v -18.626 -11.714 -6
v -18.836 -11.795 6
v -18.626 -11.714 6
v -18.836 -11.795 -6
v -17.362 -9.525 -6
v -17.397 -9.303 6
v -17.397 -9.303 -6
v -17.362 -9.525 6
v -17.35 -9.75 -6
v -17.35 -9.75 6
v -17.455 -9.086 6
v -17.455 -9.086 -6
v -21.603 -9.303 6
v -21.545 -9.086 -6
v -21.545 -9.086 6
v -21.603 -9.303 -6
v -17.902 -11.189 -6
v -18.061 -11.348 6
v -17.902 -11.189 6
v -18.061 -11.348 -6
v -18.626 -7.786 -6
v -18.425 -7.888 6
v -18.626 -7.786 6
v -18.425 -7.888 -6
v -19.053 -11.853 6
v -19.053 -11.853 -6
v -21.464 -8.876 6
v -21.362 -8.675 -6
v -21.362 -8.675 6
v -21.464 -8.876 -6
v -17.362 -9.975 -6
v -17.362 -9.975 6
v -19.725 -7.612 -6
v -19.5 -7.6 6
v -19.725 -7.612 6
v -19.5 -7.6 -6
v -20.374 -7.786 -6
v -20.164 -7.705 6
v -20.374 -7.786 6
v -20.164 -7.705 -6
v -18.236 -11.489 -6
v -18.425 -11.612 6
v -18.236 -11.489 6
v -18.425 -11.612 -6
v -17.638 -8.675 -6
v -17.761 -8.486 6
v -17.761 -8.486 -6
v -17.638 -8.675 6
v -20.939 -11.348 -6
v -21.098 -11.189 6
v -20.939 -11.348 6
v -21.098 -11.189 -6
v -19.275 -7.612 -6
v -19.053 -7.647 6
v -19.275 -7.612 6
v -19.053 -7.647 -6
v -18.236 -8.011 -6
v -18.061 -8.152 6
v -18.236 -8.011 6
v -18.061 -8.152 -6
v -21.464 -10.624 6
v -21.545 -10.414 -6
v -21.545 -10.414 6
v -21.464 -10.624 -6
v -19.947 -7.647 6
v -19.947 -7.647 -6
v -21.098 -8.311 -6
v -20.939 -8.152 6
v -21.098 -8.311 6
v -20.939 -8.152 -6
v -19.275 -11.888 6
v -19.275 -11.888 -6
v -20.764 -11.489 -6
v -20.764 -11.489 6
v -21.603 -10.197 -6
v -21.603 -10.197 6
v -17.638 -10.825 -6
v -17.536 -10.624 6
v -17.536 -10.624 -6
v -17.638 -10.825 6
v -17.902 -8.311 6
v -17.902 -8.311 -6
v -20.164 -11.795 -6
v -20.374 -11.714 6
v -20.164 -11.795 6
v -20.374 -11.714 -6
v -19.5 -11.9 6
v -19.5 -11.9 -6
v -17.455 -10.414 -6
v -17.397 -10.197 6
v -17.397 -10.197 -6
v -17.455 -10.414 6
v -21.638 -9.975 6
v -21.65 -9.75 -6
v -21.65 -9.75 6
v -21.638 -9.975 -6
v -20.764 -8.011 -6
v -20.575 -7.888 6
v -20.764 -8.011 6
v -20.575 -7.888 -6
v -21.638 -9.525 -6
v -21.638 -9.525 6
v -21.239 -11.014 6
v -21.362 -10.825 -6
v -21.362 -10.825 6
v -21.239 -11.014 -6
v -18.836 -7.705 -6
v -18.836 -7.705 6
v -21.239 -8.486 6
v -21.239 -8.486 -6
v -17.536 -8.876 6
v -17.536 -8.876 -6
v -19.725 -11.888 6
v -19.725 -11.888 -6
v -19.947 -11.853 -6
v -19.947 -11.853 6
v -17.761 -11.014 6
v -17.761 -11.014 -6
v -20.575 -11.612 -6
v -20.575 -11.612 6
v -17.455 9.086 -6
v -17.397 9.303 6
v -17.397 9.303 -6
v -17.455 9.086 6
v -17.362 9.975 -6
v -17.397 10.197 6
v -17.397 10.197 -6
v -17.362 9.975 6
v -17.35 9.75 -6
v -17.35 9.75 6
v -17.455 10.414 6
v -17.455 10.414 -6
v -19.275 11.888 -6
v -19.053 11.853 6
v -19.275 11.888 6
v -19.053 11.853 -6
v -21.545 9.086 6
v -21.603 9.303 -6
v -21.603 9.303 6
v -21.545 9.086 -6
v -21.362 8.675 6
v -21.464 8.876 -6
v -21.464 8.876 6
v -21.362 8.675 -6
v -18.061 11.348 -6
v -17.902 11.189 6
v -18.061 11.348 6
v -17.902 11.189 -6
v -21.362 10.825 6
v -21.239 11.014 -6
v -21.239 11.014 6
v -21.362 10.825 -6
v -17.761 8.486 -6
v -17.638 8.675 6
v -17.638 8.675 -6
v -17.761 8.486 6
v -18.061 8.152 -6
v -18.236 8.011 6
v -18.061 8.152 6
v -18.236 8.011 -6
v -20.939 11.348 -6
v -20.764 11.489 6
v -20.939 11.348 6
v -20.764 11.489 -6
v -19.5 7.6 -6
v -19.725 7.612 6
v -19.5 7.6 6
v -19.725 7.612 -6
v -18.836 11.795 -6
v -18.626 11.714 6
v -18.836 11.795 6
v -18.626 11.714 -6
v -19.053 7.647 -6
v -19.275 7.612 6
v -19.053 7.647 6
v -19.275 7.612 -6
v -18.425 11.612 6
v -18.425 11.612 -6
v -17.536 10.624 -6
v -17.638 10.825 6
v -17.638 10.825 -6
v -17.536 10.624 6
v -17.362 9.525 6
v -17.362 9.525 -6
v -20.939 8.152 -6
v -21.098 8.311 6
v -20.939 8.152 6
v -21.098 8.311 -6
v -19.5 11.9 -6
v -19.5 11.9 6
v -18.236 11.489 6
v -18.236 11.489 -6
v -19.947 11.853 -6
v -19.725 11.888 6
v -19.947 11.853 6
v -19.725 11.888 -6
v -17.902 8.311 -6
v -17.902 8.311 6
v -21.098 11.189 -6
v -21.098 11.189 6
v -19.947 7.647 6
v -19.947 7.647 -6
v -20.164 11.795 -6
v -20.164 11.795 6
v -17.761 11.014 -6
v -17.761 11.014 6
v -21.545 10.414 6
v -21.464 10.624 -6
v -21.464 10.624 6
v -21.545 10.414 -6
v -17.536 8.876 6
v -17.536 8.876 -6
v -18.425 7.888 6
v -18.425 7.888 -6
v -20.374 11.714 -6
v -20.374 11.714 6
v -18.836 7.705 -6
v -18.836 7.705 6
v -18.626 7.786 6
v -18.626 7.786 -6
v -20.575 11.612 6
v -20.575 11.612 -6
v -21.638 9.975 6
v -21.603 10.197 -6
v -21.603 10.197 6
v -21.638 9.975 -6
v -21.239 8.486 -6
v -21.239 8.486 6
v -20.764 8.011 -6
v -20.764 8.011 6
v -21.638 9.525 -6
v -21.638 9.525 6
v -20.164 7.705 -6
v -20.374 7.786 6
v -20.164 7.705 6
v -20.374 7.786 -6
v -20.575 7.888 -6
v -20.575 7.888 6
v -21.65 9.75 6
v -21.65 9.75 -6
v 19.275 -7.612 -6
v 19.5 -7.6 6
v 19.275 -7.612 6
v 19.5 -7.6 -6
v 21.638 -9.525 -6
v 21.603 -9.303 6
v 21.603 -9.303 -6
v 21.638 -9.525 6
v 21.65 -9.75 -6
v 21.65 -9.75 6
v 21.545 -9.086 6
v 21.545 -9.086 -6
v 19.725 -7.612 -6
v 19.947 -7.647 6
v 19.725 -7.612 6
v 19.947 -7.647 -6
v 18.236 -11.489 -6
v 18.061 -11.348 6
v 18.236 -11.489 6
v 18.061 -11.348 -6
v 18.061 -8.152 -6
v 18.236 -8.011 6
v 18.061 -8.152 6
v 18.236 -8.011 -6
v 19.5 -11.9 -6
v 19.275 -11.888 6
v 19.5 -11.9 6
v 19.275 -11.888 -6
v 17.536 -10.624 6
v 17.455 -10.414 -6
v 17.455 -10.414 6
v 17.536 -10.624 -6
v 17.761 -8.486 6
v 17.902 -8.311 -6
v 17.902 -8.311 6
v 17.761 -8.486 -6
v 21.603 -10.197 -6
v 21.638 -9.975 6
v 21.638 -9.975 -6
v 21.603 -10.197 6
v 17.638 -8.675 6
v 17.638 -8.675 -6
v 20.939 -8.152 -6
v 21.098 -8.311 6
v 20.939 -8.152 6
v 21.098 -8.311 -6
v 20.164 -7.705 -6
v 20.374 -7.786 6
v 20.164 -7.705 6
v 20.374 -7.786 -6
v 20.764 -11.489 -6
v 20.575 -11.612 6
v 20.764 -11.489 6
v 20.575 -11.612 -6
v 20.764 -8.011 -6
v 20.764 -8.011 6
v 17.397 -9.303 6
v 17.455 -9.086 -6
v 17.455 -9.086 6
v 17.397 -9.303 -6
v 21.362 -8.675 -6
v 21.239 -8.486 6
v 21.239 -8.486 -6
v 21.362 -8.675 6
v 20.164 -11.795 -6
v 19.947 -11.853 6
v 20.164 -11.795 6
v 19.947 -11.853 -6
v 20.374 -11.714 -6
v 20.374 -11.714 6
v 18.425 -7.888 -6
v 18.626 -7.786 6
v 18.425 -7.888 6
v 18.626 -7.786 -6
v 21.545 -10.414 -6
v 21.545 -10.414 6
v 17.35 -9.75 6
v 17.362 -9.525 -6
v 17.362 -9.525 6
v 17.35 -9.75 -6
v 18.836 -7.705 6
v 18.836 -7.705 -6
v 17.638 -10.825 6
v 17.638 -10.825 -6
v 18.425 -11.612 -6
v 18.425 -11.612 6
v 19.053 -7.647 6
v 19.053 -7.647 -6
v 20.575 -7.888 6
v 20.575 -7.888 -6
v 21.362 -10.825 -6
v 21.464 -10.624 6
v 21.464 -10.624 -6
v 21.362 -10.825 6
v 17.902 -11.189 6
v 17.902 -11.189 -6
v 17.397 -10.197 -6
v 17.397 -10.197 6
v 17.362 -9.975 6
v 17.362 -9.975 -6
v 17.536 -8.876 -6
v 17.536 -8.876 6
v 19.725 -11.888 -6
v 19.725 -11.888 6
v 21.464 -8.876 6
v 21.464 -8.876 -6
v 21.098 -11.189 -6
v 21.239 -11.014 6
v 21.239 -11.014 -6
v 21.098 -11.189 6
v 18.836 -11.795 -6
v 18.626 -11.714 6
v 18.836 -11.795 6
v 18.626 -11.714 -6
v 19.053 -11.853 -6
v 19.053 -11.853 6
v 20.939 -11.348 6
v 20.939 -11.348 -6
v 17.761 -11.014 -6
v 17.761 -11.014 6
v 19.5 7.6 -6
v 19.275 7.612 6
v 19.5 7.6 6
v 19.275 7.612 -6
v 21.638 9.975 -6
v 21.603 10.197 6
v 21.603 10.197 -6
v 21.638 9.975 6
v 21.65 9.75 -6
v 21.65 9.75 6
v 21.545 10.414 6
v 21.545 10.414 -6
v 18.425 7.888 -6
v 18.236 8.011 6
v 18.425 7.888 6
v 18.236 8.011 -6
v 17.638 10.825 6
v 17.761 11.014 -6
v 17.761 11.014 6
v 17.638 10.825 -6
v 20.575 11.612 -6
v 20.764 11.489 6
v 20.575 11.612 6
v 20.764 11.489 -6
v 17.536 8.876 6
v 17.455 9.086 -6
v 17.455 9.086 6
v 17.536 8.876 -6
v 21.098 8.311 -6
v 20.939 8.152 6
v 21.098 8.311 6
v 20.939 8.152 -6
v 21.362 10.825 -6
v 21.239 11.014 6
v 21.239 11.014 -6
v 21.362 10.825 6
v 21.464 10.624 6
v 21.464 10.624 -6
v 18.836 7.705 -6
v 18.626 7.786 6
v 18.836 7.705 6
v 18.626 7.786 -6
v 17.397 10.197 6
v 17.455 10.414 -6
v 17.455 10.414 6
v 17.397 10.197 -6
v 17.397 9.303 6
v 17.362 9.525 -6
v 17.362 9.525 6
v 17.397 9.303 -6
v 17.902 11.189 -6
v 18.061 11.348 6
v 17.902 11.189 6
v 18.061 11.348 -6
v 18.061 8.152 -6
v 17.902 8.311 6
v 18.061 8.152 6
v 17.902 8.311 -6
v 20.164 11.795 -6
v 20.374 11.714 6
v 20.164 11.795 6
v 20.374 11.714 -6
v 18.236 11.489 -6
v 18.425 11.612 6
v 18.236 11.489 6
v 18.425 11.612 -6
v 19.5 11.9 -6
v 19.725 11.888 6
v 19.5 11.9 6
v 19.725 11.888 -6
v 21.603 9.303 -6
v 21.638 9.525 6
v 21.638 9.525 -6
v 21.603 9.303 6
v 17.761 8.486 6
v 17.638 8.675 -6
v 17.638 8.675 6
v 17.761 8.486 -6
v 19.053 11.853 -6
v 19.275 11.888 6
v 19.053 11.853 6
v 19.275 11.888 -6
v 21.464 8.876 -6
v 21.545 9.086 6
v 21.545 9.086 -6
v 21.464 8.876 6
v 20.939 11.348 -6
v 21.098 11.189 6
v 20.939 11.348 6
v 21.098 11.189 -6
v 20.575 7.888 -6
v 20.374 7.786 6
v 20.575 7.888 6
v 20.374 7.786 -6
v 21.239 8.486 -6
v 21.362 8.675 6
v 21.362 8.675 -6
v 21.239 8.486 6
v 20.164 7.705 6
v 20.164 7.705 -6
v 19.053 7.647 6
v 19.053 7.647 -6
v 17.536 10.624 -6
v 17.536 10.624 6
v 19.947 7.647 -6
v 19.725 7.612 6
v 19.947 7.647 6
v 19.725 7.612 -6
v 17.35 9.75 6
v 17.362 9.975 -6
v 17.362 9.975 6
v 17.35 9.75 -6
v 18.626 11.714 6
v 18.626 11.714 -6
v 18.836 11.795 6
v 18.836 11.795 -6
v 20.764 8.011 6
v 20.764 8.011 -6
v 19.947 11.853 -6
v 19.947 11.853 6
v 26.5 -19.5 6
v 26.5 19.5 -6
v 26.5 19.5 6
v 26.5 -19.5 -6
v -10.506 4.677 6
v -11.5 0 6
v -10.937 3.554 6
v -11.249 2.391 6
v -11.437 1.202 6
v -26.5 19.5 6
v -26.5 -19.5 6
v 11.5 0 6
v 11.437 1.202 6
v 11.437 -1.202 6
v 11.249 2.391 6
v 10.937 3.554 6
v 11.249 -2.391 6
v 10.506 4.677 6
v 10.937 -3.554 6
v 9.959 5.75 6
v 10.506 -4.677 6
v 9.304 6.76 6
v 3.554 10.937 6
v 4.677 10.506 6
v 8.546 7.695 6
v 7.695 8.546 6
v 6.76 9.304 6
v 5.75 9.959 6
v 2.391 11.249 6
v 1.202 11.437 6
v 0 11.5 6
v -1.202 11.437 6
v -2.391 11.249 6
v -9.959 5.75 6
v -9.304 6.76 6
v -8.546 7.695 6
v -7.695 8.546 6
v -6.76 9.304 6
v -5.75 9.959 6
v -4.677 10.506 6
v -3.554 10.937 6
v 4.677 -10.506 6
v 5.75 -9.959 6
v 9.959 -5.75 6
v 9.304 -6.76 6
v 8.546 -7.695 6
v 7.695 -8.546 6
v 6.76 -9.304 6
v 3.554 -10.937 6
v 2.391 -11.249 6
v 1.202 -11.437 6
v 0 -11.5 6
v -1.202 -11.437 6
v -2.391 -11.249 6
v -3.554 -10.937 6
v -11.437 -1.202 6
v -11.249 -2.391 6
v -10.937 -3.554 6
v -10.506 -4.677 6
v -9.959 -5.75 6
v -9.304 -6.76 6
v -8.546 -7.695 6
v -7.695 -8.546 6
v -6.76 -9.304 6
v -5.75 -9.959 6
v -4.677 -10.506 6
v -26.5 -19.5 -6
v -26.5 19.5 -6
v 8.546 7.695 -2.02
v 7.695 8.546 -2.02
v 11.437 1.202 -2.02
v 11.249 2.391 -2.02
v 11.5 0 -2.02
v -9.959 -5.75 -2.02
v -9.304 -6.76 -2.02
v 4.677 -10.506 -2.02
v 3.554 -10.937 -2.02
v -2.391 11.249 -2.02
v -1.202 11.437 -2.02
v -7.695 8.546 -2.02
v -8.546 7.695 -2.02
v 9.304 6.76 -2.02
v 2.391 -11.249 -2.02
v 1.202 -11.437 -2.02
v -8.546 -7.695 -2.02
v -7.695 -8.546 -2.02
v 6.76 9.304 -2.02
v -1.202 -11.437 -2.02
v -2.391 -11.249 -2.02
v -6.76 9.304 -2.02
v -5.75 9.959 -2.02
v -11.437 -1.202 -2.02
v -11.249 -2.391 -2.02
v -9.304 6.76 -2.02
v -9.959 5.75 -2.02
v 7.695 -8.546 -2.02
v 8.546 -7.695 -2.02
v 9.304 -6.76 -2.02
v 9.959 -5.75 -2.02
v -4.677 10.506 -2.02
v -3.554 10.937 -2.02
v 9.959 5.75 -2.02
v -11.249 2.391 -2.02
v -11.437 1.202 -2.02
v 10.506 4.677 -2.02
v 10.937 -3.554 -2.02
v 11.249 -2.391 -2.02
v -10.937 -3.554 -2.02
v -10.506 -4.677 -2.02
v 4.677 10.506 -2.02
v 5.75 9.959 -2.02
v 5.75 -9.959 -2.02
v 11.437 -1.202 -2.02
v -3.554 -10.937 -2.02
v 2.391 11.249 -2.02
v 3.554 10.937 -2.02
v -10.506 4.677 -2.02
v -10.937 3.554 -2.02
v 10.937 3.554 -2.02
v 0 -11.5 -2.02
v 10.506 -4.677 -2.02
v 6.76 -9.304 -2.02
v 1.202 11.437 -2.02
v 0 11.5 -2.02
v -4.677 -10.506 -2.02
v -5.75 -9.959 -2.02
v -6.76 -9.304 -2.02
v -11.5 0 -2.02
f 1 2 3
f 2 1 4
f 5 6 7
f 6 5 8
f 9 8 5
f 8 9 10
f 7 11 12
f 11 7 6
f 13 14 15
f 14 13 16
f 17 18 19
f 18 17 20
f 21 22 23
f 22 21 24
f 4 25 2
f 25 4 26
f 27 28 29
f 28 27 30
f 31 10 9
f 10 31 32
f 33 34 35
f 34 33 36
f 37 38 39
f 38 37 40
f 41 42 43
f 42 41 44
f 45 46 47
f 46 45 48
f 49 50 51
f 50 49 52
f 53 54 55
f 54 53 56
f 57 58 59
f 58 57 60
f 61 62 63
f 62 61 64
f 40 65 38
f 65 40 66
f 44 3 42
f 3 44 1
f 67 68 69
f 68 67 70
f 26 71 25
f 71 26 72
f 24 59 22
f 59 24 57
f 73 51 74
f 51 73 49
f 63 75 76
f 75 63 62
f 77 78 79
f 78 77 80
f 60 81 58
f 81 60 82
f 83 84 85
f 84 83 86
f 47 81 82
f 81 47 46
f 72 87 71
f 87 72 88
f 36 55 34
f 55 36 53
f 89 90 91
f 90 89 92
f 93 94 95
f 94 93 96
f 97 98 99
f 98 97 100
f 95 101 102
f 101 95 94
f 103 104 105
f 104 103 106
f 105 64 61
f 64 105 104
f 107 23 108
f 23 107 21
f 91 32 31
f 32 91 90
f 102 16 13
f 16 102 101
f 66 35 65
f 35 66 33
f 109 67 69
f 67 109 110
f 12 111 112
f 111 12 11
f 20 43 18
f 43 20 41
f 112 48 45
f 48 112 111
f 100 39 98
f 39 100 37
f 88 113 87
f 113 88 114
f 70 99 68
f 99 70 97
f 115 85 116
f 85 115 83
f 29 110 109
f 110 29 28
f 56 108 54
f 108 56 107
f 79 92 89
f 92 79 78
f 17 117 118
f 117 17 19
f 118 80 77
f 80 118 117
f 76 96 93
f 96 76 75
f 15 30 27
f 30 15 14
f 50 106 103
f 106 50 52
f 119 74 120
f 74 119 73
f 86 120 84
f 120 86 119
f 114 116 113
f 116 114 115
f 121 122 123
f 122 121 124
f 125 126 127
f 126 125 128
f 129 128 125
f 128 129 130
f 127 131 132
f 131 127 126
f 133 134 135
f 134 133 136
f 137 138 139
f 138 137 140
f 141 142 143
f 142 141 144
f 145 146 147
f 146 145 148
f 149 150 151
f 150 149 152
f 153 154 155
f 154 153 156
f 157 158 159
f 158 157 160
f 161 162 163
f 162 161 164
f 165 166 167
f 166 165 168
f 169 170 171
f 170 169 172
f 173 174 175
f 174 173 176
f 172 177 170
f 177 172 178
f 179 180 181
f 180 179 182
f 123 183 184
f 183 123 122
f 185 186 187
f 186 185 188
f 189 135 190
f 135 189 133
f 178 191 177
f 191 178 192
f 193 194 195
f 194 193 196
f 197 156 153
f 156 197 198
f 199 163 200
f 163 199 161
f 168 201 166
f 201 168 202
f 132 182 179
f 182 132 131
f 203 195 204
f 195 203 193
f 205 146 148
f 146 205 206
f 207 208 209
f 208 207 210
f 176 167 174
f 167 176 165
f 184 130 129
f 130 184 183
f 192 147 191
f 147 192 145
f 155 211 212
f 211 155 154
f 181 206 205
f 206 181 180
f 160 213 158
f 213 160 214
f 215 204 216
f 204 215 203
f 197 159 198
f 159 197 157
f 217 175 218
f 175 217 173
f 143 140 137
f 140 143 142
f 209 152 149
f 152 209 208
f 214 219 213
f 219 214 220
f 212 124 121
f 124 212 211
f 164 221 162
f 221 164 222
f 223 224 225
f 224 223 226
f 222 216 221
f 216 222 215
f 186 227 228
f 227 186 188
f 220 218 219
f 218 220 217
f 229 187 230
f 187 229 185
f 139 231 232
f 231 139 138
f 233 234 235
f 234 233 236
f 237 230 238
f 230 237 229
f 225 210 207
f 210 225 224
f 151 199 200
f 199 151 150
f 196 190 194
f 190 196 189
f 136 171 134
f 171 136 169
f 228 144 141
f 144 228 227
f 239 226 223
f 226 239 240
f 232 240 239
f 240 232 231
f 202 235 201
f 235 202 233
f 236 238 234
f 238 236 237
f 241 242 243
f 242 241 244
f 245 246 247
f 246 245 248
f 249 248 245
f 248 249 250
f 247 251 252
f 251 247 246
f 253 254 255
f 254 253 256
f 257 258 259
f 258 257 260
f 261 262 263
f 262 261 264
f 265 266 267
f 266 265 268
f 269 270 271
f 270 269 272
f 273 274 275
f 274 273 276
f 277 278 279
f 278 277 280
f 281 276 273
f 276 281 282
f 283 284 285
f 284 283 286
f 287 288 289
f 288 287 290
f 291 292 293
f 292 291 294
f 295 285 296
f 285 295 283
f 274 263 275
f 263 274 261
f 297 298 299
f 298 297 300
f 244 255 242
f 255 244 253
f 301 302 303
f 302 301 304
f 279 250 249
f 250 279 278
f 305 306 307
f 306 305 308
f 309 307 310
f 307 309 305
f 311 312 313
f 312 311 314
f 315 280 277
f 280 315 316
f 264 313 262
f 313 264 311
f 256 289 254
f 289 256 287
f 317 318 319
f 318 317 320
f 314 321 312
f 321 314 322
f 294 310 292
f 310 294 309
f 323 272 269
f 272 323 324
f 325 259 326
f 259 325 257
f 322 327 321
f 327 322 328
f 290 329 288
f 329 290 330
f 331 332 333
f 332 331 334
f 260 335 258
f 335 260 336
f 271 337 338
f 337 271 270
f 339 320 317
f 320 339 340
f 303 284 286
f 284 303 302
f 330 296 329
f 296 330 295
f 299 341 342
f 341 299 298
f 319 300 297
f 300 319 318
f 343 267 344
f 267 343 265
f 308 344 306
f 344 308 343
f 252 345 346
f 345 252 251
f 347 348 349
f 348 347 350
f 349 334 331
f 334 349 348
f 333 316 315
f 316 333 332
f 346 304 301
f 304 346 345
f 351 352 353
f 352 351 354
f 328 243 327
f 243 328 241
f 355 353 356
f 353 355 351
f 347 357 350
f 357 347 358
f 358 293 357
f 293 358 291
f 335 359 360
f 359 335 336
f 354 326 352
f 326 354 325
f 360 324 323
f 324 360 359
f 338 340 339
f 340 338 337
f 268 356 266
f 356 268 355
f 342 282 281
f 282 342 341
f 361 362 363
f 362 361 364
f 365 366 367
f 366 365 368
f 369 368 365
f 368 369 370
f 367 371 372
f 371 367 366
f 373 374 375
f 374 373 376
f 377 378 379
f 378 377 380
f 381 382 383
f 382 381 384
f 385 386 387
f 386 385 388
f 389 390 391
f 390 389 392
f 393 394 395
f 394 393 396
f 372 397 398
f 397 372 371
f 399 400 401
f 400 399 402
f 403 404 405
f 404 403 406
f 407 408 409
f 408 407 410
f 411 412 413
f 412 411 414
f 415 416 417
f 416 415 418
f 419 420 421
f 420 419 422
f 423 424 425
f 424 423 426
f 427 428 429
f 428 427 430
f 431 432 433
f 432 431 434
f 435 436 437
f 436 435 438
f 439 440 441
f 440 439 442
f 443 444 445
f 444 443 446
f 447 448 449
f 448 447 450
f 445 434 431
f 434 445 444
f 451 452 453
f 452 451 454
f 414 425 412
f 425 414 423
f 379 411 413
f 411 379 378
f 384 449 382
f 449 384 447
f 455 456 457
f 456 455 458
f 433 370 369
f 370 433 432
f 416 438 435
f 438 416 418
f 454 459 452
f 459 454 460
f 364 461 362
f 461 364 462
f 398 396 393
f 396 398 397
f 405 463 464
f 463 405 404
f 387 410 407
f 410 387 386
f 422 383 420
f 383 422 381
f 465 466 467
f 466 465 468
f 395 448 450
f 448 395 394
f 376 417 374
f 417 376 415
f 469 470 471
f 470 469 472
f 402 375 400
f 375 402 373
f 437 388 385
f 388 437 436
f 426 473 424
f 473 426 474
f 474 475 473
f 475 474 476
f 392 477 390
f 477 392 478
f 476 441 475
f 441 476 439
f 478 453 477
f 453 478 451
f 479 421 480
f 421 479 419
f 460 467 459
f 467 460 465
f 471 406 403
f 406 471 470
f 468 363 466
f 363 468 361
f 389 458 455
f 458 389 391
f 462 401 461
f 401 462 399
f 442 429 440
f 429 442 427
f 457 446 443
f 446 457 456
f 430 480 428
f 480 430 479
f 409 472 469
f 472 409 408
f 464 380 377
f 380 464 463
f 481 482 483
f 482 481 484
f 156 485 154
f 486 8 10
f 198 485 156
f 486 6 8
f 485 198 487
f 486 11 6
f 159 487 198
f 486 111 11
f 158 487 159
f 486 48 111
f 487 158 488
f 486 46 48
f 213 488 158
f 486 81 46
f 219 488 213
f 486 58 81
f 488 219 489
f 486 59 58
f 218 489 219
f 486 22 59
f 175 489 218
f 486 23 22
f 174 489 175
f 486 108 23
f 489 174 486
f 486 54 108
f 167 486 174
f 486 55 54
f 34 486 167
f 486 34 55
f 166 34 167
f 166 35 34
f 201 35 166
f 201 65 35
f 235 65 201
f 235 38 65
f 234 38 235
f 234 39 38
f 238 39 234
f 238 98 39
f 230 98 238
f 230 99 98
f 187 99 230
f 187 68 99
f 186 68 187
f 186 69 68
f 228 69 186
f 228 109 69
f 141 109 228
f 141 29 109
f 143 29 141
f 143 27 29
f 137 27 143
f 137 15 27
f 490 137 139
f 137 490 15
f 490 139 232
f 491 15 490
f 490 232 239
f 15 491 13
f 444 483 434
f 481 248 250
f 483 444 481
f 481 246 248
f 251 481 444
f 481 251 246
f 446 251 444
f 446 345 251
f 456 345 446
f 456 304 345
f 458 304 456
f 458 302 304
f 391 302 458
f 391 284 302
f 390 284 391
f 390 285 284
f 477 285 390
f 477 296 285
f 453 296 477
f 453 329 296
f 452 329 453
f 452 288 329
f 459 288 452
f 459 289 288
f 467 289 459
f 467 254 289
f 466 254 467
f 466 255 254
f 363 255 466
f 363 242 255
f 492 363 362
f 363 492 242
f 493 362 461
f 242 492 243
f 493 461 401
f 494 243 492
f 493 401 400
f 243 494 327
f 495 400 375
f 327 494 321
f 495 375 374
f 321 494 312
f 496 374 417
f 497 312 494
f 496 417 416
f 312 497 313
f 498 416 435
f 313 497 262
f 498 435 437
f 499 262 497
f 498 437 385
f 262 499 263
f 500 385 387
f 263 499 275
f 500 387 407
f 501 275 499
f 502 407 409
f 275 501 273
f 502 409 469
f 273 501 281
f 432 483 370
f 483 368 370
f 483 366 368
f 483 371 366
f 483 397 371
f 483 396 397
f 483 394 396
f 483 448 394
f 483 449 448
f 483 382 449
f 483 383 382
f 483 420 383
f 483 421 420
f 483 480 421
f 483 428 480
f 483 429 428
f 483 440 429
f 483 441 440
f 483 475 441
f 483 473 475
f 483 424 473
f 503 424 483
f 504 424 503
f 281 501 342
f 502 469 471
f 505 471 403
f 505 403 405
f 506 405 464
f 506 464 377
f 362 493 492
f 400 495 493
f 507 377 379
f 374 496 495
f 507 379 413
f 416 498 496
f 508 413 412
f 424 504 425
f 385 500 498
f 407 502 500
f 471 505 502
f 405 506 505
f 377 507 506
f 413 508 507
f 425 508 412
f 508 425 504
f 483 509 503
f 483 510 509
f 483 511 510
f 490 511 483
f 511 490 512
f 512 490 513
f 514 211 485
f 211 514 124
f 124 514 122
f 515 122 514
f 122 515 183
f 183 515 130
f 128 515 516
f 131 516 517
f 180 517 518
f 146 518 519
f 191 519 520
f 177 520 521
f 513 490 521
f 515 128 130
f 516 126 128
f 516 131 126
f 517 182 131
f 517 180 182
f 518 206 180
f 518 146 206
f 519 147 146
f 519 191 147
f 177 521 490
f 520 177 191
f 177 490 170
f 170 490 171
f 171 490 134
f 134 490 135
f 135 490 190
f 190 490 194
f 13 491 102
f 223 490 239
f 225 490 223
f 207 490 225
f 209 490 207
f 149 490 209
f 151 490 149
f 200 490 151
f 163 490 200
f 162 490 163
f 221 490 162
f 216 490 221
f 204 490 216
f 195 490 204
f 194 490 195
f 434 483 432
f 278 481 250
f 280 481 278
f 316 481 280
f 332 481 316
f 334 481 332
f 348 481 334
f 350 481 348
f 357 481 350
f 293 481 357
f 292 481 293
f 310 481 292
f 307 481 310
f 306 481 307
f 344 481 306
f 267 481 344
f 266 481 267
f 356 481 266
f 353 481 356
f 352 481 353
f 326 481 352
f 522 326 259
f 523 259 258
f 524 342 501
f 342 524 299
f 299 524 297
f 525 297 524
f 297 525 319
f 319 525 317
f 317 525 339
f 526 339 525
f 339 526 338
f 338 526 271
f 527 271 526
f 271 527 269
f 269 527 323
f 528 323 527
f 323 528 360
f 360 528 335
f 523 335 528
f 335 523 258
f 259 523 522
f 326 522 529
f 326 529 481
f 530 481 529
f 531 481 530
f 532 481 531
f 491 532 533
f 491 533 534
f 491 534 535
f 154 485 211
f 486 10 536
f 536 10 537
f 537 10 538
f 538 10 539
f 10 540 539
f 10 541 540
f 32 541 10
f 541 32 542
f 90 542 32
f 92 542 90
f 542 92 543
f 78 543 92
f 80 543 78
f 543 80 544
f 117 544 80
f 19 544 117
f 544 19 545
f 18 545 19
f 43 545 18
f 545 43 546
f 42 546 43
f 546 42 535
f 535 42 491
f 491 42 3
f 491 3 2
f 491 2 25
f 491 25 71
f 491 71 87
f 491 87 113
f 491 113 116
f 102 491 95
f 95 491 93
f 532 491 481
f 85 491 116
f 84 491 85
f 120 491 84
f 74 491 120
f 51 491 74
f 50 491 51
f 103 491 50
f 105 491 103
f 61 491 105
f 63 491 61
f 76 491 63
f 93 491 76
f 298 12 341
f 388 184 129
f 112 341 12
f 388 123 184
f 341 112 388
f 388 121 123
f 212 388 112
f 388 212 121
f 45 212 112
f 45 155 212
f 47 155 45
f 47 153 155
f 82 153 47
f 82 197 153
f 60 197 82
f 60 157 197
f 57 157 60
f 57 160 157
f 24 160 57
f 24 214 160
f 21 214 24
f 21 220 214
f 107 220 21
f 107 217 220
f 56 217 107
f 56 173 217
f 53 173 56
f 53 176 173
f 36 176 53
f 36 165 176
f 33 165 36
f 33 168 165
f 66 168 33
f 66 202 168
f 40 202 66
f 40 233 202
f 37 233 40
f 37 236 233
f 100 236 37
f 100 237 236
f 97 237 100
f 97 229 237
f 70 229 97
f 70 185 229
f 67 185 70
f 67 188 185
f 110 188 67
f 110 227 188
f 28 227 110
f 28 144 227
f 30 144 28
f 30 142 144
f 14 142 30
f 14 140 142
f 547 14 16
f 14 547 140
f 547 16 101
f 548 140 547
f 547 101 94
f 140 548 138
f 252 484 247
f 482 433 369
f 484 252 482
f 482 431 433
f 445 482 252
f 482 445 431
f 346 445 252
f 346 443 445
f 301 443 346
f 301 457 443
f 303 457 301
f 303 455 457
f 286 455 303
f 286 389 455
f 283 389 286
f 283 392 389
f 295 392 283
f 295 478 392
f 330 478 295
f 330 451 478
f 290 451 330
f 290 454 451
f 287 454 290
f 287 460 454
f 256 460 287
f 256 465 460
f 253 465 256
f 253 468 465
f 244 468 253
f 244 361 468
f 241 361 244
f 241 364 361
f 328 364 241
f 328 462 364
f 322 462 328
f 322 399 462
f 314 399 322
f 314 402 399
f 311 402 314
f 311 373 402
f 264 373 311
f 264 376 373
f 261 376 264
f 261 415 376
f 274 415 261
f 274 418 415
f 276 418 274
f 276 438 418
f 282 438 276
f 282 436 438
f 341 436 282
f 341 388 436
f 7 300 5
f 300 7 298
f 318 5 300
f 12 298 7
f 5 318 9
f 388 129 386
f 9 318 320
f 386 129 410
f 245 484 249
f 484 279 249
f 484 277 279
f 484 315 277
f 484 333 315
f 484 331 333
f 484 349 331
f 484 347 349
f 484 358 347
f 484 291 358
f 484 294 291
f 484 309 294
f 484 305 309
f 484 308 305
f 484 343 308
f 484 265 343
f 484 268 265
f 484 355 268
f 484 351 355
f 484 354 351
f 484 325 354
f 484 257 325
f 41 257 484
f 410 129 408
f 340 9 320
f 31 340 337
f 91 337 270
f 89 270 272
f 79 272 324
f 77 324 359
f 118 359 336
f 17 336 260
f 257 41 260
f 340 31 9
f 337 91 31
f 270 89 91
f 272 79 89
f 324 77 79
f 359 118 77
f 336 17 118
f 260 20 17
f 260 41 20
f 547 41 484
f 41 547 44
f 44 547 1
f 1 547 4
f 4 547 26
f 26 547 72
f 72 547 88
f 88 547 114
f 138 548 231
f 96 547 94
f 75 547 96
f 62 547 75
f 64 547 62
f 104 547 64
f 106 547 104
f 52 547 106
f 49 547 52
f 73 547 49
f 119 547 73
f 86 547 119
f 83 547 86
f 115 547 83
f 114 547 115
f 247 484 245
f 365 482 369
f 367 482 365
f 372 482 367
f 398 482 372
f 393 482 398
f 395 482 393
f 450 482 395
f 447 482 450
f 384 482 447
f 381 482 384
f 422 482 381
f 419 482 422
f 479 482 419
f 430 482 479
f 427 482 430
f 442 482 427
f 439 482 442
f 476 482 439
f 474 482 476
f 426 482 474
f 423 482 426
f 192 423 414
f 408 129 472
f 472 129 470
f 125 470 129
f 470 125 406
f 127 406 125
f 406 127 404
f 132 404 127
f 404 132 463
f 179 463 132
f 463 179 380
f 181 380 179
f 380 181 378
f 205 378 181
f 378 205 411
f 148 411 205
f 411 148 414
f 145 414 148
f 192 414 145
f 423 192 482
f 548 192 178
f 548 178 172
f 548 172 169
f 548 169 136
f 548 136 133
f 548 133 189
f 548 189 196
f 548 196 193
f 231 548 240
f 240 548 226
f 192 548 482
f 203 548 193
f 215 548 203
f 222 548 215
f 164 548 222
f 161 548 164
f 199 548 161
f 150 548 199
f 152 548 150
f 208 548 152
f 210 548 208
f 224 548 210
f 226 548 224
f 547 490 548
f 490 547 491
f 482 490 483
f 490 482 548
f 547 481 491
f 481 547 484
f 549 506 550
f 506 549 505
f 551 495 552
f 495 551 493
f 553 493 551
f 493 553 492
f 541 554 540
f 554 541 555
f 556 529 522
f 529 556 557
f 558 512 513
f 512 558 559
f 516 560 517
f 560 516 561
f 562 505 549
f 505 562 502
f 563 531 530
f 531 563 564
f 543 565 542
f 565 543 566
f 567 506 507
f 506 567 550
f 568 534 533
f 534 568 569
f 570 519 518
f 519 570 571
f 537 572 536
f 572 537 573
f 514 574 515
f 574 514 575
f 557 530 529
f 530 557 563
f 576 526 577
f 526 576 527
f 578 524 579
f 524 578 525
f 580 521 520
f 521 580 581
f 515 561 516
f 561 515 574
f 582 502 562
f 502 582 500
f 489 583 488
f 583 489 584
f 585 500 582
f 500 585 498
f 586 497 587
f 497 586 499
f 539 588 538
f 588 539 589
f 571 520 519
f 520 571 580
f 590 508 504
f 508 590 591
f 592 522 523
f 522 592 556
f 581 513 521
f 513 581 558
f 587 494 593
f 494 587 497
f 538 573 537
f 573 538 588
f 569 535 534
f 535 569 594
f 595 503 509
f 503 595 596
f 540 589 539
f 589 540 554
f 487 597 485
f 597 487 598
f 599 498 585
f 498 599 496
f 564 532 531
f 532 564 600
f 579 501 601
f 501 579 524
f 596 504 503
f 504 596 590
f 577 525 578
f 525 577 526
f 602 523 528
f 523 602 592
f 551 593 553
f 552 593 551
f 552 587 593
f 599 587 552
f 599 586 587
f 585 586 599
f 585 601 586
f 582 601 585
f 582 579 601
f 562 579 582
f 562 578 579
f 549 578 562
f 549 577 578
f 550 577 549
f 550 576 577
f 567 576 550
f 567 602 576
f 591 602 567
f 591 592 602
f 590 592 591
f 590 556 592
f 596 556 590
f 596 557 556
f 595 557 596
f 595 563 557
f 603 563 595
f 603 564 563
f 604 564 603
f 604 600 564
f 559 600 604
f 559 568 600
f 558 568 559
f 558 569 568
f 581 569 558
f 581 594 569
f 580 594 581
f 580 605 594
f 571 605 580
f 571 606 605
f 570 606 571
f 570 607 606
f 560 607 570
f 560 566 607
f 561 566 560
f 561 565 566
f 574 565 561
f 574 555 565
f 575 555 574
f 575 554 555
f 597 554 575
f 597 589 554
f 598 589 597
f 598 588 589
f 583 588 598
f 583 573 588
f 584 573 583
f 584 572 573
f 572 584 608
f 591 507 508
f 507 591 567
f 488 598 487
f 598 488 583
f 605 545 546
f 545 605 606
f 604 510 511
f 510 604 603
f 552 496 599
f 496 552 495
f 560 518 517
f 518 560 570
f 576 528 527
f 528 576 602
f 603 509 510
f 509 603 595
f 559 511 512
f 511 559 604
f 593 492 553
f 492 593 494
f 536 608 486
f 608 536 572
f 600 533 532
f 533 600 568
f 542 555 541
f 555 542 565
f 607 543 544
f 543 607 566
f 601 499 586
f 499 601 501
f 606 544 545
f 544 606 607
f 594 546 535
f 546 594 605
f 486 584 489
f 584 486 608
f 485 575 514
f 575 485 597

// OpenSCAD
// Lead-screw nut holder with 23 mm pocket.
$fn = 60;
eps = 0.02;
body_l = 53;
body_w = 39;
body_t = 12;
pocket_d = 23;
pocket_depth = 8;
mount_x = 19.5;
difference() {
    cube([body_l, body_w, body_t], center = true);
    translate([0, 0, body_t / 2 - pocket_depth - eps]) cylinder(d = pocket_d, h = pocket_depth + 2 * eps);
    for (x = [-mount_x, mount_x], y = [-body_w / 4, body_w / 4])
        translate([x, y, -body_t / 2 - eps]) cylinder(d = 4.3, h = body_t + 2 * eps);
}
